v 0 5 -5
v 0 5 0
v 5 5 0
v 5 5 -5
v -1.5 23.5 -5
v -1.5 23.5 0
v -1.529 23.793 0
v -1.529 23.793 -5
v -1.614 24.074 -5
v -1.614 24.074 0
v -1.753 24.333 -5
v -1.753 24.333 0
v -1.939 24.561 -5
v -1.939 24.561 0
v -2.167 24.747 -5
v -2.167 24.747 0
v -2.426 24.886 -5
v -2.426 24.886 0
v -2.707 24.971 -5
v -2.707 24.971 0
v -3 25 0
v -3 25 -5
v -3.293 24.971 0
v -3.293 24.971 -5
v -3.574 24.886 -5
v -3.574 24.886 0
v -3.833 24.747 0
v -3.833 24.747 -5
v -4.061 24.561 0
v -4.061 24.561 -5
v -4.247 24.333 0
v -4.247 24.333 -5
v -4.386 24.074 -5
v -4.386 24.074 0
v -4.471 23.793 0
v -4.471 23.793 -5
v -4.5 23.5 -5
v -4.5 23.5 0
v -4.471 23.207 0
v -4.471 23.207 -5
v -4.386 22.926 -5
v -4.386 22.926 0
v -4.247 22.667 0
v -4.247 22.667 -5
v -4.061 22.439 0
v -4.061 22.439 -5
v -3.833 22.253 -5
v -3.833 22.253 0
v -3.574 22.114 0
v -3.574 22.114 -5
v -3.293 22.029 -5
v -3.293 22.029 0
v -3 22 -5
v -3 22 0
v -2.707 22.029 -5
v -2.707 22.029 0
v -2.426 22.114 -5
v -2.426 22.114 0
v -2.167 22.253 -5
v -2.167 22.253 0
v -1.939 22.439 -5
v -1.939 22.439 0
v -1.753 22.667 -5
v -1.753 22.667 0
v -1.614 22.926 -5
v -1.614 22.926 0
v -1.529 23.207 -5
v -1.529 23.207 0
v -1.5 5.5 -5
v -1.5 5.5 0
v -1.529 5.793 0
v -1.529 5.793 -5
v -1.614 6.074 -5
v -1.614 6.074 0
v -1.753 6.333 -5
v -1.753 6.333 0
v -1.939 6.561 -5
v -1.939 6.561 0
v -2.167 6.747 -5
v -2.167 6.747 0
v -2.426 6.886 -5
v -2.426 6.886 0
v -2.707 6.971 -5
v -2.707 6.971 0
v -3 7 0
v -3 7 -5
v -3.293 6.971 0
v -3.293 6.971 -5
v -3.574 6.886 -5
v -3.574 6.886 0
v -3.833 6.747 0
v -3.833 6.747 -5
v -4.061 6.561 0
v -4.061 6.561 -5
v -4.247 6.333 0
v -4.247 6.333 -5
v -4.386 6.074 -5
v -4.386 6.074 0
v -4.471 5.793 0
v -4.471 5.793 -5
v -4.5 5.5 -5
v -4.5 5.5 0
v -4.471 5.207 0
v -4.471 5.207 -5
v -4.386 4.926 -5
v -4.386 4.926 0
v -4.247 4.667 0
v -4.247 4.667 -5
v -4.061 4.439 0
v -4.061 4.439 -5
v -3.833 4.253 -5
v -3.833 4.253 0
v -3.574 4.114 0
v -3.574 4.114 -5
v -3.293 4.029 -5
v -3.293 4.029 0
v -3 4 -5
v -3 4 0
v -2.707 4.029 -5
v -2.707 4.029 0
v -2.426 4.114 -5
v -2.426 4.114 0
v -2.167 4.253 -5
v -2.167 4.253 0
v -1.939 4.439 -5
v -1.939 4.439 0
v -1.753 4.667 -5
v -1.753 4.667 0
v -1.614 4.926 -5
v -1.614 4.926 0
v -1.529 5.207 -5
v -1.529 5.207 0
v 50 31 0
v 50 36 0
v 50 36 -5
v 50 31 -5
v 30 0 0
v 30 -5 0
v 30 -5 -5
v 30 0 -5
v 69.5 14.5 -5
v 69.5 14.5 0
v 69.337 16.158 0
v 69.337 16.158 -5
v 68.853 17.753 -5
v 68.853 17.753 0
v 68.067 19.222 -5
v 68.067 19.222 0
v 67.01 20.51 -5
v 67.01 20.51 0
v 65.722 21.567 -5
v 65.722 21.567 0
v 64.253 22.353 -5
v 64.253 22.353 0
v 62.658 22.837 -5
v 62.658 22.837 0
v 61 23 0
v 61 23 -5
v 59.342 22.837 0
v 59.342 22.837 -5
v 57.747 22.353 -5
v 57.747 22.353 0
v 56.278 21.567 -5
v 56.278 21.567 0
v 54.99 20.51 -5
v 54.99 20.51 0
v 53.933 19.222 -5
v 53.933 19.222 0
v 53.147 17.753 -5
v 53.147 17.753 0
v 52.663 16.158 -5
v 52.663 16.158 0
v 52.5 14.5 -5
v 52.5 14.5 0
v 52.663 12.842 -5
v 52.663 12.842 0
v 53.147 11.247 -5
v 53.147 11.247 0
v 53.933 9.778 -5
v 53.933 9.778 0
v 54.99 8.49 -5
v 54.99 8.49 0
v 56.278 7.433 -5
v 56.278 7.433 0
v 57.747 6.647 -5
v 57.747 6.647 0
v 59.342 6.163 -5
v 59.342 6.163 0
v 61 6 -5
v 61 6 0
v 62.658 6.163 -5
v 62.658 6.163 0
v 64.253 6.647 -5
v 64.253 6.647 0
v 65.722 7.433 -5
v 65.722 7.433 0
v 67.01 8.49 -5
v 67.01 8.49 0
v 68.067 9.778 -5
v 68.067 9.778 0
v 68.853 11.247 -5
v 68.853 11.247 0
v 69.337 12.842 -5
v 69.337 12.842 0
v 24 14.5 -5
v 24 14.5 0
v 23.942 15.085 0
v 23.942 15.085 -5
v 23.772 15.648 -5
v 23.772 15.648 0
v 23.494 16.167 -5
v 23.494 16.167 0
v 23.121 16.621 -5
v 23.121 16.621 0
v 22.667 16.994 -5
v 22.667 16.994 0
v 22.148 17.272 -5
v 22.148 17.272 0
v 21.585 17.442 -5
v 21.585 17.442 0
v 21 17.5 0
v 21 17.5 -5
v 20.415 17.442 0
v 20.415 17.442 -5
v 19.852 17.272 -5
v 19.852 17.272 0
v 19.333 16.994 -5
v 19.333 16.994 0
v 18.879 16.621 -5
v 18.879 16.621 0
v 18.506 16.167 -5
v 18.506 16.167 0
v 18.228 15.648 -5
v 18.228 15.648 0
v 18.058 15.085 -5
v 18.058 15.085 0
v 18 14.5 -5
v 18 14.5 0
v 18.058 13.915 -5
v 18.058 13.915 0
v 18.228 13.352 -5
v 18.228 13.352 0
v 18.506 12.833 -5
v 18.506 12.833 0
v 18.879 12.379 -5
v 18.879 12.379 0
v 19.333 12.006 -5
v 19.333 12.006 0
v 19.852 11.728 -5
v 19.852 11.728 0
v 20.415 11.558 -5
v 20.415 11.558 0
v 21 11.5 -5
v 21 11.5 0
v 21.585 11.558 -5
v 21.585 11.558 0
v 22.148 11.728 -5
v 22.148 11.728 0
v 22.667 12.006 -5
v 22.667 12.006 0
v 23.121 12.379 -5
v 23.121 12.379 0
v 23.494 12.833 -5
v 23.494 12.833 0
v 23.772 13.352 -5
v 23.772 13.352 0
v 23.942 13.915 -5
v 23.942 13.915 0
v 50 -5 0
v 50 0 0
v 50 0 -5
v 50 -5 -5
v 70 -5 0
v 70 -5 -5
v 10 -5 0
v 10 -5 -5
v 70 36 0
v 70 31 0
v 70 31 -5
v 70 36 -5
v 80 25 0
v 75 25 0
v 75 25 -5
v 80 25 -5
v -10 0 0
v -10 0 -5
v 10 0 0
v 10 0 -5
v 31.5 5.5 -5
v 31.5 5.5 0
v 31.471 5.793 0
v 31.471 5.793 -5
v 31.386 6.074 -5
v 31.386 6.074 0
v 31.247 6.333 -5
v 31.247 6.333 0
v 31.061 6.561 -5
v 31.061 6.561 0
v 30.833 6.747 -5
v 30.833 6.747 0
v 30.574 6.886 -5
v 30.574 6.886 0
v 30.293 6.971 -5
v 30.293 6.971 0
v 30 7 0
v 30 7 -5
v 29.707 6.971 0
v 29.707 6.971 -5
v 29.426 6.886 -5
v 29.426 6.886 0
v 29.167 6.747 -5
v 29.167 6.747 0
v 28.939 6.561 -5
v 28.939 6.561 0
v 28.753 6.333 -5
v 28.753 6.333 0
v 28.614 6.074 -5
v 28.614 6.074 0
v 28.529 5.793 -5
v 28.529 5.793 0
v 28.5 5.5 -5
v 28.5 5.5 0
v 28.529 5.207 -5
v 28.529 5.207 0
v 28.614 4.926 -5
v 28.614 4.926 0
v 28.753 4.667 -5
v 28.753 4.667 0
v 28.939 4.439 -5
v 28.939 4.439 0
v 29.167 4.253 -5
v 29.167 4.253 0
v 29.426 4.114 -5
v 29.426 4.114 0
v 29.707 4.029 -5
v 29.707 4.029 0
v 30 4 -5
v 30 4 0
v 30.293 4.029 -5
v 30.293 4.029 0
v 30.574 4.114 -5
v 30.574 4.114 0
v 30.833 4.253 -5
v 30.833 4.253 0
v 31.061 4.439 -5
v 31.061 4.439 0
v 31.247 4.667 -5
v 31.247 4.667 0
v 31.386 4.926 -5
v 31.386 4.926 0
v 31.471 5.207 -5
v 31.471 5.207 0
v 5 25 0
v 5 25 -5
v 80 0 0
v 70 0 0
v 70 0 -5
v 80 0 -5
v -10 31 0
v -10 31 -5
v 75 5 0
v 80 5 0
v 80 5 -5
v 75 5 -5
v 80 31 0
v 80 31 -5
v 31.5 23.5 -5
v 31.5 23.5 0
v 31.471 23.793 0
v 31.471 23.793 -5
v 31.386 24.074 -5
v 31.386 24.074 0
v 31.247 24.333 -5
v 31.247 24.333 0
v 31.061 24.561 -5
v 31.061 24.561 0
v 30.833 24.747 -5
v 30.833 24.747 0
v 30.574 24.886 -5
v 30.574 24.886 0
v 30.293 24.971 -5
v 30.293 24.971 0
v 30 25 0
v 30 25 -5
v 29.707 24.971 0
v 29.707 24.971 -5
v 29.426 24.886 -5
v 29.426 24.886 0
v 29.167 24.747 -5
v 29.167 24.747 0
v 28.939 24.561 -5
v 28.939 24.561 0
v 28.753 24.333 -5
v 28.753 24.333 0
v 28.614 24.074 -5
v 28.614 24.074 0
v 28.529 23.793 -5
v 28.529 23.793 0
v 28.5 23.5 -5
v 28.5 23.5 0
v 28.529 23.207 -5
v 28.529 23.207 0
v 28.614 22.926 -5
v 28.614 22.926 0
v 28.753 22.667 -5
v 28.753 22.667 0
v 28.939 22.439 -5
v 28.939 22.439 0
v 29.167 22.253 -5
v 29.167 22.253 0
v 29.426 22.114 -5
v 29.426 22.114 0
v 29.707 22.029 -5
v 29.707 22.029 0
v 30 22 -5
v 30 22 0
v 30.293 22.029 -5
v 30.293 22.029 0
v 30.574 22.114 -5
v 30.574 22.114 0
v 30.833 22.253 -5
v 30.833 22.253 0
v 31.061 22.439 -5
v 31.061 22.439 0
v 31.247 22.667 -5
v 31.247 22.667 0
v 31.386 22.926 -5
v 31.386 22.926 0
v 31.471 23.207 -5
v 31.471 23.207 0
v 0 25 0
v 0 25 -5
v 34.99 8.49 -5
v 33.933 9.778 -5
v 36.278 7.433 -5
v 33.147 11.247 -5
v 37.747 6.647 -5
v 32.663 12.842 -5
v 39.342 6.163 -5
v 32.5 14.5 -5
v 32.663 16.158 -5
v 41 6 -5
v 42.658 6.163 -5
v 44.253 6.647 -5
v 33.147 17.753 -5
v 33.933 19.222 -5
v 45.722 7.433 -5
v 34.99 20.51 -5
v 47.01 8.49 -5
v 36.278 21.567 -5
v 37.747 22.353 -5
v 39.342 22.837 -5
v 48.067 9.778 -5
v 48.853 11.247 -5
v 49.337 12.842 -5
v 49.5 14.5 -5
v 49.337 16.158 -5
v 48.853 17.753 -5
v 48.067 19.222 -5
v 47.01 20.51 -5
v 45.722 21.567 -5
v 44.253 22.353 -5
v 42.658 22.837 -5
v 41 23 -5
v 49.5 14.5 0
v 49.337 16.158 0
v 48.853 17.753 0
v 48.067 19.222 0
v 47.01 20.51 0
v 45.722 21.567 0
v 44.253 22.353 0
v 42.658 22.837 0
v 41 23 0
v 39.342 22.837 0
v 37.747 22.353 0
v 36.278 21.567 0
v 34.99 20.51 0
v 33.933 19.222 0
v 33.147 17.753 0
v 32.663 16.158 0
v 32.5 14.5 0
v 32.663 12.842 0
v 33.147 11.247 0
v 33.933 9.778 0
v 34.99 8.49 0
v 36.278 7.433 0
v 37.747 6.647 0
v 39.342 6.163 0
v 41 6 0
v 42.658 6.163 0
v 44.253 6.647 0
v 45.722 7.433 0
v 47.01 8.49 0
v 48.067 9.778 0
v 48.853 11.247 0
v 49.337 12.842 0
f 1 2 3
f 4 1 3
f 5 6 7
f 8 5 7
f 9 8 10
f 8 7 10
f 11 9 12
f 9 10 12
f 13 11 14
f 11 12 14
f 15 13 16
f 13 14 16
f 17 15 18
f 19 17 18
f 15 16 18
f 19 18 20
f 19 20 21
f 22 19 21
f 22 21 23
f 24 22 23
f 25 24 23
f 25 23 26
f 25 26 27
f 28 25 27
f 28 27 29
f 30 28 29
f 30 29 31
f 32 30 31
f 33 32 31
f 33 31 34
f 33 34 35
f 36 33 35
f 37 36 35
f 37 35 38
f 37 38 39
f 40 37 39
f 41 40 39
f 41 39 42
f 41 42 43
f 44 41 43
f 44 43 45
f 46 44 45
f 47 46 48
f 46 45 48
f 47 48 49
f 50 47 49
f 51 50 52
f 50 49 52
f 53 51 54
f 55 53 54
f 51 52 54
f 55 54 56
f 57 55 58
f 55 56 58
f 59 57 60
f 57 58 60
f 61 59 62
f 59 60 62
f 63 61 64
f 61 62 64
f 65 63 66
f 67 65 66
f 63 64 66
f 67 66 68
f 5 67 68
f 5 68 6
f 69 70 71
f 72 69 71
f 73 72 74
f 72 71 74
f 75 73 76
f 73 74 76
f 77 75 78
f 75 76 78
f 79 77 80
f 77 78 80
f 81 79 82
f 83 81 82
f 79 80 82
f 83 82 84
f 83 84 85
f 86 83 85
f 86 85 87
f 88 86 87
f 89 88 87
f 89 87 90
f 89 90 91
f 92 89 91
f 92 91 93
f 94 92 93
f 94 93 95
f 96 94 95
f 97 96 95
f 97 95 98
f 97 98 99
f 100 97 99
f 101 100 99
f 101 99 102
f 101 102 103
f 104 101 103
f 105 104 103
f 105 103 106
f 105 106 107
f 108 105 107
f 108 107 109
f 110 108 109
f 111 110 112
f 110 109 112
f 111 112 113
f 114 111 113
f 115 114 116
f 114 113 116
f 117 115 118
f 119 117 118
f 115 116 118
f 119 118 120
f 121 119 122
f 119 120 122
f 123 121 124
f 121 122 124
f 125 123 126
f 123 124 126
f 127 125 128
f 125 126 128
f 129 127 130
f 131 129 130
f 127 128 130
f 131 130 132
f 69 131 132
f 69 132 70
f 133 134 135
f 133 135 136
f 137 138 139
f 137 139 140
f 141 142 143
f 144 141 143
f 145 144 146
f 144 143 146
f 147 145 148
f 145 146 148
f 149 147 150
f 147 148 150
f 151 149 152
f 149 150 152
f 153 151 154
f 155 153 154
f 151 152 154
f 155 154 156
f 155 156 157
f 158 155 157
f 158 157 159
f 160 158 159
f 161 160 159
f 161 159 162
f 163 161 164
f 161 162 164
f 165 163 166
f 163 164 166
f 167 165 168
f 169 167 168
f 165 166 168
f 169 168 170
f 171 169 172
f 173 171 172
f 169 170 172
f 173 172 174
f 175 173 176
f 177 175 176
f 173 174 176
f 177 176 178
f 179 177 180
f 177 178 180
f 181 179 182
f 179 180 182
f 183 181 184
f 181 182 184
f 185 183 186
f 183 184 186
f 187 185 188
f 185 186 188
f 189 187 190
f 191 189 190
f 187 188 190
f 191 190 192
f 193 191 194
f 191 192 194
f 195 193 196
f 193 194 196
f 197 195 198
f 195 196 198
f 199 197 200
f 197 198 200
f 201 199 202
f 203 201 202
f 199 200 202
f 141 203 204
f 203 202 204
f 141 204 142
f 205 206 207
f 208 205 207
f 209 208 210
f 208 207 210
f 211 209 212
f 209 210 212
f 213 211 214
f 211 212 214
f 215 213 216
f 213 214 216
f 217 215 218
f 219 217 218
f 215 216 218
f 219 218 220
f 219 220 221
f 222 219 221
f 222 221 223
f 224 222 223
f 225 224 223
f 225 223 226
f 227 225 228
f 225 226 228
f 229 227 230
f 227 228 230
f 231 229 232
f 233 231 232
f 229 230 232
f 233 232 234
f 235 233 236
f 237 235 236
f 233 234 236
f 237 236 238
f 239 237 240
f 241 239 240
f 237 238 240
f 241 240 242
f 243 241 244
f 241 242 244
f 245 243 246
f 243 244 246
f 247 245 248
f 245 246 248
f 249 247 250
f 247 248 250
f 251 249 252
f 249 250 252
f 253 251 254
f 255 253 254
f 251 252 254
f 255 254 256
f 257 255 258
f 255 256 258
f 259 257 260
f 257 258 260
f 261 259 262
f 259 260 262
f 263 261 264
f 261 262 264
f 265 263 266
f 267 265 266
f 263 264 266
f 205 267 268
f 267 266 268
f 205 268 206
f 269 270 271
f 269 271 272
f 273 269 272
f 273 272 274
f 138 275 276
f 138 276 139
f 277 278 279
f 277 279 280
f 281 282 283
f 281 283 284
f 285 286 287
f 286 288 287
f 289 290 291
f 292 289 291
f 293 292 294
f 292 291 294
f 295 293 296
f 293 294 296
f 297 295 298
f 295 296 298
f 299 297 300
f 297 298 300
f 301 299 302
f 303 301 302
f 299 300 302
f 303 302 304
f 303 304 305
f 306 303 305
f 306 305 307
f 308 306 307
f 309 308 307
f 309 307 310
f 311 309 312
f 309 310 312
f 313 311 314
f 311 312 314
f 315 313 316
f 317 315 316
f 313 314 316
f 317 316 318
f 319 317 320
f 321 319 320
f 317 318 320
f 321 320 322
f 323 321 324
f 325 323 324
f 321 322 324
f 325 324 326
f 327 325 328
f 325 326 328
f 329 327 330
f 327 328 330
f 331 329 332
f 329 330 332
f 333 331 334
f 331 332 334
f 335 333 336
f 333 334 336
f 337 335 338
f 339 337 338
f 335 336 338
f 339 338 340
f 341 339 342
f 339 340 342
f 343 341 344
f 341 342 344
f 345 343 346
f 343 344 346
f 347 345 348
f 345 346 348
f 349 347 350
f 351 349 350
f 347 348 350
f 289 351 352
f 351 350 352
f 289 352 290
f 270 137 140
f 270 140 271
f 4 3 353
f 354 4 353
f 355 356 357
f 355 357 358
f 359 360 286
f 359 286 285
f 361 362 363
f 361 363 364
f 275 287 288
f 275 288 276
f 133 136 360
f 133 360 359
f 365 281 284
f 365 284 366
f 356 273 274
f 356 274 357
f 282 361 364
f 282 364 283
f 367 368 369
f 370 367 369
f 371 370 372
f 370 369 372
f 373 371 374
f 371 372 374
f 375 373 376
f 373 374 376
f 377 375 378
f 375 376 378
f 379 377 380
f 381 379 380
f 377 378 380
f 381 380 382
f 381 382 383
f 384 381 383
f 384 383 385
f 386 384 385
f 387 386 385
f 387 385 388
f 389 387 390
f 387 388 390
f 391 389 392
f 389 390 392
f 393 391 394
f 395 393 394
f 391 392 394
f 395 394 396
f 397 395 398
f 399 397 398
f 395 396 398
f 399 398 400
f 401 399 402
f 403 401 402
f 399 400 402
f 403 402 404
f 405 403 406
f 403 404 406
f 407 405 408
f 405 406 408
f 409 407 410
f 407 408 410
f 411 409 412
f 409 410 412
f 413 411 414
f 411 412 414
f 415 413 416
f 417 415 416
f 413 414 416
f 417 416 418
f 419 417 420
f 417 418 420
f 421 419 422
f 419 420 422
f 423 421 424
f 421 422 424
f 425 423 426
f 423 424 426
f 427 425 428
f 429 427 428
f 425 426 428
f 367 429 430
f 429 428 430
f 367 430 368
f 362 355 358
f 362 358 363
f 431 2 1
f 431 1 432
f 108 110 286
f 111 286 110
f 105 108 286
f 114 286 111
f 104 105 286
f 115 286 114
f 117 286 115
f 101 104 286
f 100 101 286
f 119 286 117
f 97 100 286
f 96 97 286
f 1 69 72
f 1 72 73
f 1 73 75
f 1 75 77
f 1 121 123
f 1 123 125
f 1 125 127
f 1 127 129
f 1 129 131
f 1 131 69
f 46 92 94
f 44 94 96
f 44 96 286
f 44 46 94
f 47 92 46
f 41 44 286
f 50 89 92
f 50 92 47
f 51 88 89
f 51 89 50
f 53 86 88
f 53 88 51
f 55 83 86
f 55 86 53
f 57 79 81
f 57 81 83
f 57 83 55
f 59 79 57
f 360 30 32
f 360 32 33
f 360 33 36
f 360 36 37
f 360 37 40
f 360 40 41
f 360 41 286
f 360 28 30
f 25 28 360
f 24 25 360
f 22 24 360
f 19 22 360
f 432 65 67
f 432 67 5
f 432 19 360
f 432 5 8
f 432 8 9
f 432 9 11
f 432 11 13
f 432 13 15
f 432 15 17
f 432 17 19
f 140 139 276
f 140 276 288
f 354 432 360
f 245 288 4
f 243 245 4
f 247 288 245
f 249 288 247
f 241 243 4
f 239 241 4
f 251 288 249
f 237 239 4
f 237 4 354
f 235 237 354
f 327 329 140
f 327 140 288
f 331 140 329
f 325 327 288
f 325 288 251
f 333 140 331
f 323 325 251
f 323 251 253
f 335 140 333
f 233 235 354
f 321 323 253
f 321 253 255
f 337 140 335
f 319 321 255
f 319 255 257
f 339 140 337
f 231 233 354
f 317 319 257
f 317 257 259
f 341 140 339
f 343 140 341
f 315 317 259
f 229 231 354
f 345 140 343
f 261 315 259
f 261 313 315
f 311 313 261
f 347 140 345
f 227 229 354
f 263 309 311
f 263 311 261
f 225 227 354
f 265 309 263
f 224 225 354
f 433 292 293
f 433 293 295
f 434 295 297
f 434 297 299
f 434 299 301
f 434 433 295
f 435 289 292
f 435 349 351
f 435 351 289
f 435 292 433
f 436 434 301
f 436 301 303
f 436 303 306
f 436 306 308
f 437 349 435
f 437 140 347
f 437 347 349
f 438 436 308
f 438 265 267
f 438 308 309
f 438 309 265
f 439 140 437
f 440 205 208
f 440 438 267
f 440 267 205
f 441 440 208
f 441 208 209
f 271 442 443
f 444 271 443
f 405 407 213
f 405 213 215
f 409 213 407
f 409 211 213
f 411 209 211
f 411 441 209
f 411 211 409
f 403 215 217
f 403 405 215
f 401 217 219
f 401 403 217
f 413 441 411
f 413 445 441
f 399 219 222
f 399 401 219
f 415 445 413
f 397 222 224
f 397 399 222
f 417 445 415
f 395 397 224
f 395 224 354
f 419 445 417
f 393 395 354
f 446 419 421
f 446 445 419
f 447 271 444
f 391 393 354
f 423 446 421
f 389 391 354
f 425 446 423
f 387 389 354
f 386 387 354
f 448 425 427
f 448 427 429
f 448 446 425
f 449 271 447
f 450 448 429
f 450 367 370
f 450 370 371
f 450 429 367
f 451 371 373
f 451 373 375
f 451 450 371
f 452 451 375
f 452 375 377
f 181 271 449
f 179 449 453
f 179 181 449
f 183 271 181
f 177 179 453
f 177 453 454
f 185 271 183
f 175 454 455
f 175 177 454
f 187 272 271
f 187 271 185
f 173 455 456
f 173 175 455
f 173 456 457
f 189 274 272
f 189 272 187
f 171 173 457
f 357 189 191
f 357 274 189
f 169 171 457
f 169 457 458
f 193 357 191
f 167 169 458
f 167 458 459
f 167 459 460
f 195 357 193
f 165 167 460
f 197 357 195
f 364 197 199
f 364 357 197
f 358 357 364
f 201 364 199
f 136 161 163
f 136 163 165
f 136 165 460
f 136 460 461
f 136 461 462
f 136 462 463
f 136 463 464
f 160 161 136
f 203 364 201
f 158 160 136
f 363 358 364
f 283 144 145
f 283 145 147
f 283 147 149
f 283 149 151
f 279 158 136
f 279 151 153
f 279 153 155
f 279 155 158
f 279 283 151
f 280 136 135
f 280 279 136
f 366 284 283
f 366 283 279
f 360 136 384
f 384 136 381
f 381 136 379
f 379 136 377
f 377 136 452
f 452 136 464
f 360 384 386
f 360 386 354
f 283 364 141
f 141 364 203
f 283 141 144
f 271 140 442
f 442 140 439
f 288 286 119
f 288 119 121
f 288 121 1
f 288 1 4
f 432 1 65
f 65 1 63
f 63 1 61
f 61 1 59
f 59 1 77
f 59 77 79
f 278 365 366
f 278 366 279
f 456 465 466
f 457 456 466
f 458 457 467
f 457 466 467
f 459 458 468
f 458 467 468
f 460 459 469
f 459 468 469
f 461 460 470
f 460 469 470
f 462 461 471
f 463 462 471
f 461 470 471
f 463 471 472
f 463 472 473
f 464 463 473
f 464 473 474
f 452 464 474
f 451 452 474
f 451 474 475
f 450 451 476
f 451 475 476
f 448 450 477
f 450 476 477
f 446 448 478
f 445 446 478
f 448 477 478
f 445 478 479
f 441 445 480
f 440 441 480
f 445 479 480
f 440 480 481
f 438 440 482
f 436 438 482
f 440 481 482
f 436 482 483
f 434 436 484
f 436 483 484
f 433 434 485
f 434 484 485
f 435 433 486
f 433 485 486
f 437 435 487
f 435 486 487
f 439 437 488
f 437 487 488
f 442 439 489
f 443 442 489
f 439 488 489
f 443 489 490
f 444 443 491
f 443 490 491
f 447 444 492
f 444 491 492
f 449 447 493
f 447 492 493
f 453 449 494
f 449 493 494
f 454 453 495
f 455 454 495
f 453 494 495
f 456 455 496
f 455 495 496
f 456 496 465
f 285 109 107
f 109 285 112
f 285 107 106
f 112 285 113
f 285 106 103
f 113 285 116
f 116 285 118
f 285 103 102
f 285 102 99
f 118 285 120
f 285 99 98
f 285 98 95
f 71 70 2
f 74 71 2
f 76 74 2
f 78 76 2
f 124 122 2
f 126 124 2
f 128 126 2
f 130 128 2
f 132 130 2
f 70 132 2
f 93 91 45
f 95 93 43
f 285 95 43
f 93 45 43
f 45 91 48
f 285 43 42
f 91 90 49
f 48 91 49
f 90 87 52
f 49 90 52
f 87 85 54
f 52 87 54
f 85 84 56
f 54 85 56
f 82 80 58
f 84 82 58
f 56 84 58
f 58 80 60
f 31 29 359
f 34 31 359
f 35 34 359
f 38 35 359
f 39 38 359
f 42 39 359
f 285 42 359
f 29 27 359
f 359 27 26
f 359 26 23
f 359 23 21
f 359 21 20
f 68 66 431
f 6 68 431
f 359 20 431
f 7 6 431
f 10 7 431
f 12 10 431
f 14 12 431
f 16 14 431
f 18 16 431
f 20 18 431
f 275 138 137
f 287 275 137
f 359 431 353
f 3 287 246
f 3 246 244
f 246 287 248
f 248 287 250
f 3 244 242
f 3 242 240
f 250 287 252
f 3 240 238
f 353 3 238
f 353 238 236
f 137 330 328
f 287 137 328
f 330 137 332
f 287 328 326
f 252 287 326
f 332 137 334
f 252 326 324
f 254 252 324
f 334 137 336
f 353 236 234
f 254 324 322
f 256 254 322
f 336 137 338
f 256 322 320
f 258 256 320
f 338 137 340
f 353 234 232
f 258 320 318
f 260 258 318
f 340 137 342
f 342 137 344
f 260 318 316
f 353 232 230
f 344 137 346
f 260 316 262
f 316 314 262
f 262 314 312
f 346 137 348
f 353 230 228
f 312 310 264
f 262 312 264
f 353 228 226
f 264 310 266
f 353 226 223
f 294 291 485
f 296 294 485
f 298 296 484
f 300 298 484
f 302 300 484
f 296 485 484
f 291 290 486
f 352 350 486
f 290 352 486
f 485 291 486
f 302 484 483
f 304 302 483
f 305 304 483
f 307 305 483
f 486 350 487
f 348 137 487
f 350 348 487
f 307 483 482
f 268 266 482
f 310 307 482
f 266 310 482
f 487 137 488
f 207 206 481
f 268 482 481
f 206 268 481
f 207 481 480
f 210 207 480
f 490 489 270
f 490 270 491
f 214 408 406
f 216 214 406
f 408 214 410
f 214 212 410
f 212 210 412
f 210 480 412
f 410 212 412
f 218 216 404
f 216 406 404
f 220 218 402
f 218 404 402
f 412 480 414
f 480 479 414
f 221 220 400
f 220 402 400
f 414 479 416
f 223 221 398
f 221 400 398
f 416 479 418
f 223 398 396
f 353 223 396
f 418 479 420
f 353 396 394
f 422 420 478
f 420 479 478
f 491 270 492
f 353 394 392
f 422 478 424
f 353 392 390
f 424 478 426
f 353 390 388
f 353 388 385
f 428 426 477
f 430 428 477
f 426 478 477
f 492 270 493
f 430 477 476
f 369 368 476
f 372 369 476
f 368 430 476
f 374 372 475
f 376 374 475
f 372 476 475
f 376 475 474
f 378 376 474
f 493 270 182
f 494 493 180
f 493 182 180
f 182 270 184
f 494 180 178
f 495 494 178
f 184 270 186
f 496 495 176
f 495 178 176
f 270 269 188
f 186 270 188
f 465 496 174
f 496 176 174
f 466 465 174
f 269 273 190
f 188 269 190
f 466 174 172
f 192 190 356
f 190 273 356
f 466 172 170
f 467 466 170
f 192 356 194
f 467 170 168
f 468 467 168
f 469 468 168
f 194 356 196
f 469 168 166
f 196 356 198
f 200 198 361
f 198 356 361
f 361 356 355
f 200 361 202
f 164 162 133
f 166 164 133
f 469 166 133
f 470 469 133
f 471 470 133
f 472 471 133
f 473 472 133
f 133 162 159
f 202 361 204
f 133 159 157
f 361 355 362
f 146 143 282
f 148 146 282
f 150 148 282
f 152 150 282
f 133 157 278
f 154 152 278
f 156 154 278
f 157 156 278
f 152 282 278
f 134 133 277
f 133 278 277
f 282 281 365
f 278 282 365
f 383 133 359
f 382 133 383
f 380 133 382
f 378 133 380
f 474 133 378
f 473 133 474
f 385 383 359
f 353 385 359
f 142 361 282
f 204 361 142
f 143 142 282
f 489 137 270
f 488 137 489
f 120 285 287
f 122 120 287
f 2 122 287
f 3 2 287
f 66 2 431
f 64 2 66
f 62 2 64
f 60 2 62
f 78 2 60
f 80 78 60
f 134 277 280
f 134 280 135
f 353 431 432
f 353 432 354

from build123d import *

# Parameters (mm, degrees)
SKETCH2_R           = 3
SKETCH2_R_2         = 8.5
SKETCH2_R_3         = 1.5
BOSS_EXTRUDE1_DEPTH = 5
SKETCH3_W           = 5
SKETCH3_H           = 31
BOSS_EXTRUDE2_DEPTH = 10
SKETCH4_R           = 1.5
SKETCH4_W           = 5
SKETCH4_H           = 20
CUT_EXTRUDE1_DEPTH  = 10


with BuildPart() as part:
    # Sketch2 → Boss-Extrude1 (new body)
    with BuildSketch(Plane.XY):
        Polygon((0, 0), (10, 0), (10, -5), (30, -5), (30, 0), (50, 0), (50, -5), (70, -5), (70, 0), (80, 0), (80, 5), (75, 5), (75, 23), (75, 25), (80, 25), (80, 31), (70, 31), (70, 36), (50, 36), (50, 31), (0, 31), align=None)
        with Locations((21, 14.5)):
            Circle(SKETCH2_R, mode=Mode.SUBTRACT)
        with Locations((41, 14.5)):
            Circle(SKETCH2_R_2, mode=Mode.SUBTRACT)
        with Locations((61, 14.5)):
            Circle(SKETCH2_R_2, mode=Mode.SUBTRACT)
        with Locations((30, 23.5)):
            Circle(SKETCH2_R_3, mode=Mode.SUBTRACT)
        with Locations((30, 5.5)):
            Circle(SKETCH2_R_3, mode=Mode.SUBTRACT)
    extrude(amount=-BOSS_EXTRUDE1_DEPTH)

    # Sketch3 → Boss-Extrude2 (add)
    with BuildSketch(Plane.ZY):
        with Locations((-2.5, 15.5)):
            Rectangle(SKETCH3_W, SKETCH3_H)
    extrude(amount=BOSS_EXTRUDE2_DEPTH)

    # Sketch4 → Cut-Extrude1 (cut)
    with BuildSketch(Plane.XY):
        with Locations((-3, 23.5)):
            Circle(SKETCH4_R)
        with Locations((-3, 5.5)):
            Circle(SKETCH4_R)
        with Locations((2.5, 15)):
            Rectangle(SKETCH4_W, SKETCH4_H)
    extrude(amount=-CUT_EXTRUDE1_DEPTH, mode=Mode.SUBTRACT)


solid = part.part
